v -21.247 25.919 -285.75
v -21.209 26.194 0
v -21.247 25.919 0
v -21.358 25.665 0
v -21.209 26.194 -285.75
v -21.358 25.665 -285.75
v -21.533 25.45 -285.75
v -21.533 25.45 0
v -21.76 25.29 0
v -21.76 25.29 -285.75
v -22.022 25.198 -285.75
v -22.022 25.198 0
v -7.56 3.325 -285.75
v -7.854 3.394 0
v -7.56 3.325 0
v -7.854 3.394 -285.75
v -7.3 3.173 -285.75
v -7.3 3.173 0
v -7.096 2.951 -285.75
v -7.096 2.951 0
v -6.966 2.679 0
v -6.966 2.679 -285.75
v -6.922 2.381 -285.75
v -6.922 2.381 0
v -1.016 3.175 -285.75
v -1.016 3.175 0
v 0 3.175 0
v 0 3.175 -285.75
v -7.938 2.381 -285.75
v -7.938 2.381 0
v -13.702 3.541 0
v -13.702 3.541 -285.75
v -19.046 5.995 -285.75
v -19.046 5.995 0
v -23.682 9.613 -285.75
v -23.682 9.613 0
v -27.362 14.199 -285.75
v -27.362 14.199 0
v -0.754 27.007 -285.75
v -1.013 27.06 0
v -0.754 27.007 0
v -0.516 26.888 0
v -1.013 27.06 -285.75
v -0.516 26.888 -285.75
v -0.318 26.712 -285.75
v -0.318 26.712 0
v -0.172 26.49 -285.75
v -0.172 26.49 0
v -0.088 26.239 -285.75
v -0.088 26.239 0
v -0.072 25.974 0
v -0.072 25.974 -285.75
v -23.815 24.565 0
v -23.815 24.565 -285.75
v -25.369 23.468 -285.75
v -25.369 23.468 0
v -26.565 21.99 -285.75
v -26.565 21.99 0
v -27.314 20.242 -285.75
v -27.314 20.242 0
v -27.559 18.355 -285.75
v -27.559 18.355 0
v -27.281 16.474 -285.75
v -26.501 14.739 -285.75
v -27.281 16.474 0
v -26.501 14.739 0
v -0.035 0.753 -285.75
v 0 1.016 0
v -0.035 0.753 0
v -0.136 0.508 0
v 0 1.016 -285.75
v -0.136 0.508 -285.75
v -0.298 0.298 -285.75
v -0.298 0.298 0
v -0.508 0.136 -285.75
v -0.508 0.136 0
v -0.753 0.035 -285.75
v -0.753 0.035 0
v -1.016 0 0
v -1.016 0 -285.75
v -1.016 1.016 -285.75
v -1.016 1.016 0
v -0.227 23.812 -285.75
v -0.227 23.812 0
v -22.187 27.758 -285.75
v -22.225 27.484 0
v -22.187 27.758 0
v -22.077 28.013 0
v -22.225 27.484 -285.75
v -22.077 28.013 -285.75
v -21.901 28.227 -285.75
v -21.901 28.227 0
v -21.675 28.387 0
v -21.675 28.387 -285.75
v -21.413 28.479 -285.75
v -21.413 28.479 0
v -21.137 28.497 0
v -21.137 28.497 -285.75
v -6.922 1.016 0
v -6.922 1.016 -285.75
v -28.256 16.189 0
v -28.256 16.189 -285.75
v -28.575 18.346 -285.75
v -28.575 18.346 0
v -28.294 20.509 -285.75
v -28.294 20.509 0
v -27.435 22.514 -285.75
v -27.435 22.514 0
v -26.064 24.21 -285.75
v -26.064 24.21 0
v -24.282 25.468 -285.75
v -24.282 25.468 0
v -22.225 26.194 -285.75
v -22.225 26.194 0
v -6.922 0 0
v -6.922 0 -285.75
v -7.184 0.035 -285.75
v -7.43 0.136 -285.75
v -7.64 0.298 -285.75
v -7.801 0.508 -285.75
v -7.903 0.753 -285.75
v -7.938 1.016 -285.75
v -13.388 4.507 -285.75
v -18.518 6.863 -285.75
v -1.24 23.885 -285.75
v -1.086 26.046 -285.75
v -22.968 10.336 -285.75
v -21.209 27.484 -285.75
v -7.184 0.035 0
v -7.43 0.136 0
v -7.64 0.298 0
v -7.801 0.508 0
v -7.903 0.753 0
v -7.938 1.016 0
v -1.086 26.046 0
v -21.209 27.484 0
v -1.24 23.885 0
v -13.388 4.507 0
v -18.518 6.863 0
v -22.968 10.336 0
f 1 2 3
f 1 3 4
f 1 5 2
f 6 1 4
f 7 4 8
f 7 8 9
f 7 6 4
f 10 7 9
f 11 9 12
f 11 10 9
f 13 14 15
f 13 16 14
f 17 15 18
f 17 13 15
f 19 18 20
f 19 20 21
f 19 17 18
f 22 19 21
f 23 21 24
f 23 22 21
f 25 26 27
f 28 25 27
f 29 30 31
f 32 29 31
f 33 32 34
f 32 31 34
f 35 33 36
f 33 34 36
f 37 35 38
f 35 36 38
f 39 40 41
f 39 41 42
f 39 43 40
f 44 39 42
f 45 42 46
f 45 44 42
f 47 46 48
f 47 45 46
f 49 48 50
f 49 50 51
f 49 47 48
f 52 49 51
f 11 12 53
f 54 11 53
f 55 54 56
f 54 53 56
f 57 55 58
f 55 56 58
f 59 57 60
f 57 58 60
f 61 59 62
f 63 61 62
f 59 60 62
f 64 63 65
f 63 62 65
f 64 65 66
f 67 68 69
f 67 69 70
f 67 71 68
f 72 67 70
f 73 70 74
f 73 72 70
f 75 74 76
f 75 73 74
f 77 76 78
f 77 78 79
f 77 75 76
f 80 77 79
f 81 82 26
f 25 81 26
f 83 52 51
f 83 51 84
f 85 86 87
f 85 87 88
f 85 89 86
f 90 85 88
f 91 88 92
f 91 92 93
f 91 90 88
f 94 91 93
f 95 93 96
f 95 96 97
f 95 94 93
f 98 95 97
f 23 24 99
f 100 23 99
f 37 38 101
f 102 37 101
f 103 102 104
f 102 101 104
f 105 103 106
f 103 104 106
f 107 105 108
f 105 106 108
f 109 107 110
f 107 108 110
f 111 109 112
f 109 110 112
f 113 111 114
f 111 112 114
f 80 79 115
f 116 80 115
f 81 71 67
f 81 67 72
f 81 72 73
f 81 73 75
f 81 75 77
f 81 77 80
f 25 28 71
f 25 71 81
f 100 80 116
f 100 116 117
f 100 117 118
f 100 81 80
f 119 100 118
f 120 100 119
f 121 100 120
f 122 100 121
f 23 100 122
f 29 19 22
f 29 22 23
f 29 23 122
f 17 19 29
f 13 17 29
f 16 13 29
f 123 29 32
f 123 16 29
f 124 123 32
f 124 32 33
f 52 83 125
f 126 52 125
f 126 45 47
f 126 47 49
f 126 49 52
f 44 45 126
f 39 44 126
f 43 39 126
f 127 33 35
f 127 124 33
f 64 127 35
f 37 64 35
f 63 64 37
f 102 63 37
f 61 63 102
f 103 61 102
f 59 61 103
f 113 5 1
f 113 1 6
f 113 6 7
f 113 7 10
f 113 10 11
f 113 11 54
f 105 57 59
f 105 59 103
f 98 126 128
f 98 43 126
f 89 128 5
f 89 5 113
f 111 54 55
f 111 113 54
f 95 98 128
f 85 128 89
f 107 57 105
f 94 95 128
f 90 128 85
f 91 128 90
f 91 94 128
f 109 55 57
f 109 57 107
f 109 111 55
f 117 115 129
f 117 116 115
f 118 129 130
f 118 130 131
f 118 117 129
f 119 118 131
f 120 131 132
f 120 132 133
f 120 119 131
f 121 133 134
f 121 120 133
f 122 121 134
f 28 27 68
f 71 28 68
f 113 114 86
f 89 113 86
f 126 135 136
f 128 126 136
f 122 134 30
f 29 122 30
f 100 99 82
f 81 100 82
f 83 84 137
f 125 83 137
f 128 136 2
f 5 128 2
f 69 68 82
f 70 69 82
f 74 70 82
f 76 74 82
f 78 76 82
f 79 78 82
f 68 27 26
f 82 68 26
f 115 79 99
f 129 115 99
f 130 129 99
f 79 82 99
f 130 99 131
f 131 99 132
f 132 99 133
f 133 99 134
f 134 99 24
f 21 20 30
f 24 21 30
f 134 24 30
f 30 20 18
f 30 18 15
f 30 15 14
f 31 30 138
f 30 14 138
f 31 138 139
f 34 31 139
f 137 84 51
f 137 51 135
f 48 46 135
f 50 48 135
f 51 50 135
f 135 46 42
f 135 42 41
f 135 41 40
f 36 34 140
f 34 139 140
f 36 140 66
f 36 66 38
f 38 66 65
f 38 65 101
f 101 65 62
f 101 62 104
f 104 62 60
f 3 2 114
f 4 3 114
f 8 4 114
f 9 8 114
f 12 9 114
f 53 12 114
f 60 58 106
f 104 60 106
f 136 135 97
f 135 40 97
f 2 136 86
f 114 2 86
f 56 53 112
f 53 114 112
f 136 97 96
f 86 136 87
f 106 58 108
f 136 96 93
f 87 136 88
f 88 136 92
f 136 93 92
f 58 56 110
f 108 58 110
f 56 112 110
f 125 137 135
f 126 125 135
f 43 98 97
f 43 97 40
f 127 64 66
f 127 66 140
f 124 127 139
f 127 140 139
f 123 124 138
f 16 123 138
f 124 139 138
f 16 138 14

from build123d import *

# Parameters (mm, degrees)
EXTRUDE_THIN1_DEPTH = 285.75
FILLET1_R           = 1.016


with BuildPart() as part:
    # Sketch1 → Extrude-Thin1 (new body)
    with BuildSketch(Plane.XY):
        with BuildLine():
            Line((0, 3.175), (0, 0))
            Line((0, 0), (-7.9375, 0))
            Line((-7.9375, 0), (-7.9375, 2.38125))
            ThreePointArc((-7.9375, 2.38125), (-19.045912437, 5.99541523), (-27.361917214, 14.199260776))
            ThreePointArc((-27.361917214, 14.199260776), (-27.934001551, 21.541515485), (-22.225, 26.19375))
            Line((-22.225, 26.19375), (-22.225, 28.575))
            Line((-22.225, 28.575), (0, 26.9875))
            Line((0, 26.9875), (-0.226785714, 23.8125))
            Line((-0.226785714, 23.8125), (-1.240203753, 23.884887003))
            Line((-1.240203753, 23.884887003), (-1.085805042, 26.046468964))
            Line((-1.085805042, 26.046468964), (-21.209, 27.483840032))
            Line((-21.209, 27.483840032), (-21.209, 25.314485679))
            ThreePointArc((-21.209, 25.314485679), (-26.827226174, 21.514111333), (-26.50119181, 14.739082765))
            ThreePointArc((-26.50119181, 14.739082765), (-18.11648679, 6.624447995), (-6.9215, 3.334638499))
            Line((-6.9215, 3.334638499), (-6.9215, 1.016))
            Line((-6.9215, 1.016), (-1.016, 1.016))
            Line((-1.016, 1.016), (-1.016, 3.175))
            Line((-1.016, 3.175), (0, 3.175))
        make_face()
    extrude(amount=-EXTRUDE_THIN1_DEPTH)

    # Fillet1
    fillet1_edges = [part.edges().sort_by_distance(p)[0] for p in [
        (-21.209, 25.314485679, -142.875),
        (-6.9215, 3.334638499, -142.875),
        (0, 0, -142.875),
        (-7.9375, 0, -142.875),
        (-22.225, 28.575, -142.875),
        (0, 26.9875, -142.875),
    ]]
    fillet(fillet1_edges, radius=FILLET1_R)


solid = part.part
